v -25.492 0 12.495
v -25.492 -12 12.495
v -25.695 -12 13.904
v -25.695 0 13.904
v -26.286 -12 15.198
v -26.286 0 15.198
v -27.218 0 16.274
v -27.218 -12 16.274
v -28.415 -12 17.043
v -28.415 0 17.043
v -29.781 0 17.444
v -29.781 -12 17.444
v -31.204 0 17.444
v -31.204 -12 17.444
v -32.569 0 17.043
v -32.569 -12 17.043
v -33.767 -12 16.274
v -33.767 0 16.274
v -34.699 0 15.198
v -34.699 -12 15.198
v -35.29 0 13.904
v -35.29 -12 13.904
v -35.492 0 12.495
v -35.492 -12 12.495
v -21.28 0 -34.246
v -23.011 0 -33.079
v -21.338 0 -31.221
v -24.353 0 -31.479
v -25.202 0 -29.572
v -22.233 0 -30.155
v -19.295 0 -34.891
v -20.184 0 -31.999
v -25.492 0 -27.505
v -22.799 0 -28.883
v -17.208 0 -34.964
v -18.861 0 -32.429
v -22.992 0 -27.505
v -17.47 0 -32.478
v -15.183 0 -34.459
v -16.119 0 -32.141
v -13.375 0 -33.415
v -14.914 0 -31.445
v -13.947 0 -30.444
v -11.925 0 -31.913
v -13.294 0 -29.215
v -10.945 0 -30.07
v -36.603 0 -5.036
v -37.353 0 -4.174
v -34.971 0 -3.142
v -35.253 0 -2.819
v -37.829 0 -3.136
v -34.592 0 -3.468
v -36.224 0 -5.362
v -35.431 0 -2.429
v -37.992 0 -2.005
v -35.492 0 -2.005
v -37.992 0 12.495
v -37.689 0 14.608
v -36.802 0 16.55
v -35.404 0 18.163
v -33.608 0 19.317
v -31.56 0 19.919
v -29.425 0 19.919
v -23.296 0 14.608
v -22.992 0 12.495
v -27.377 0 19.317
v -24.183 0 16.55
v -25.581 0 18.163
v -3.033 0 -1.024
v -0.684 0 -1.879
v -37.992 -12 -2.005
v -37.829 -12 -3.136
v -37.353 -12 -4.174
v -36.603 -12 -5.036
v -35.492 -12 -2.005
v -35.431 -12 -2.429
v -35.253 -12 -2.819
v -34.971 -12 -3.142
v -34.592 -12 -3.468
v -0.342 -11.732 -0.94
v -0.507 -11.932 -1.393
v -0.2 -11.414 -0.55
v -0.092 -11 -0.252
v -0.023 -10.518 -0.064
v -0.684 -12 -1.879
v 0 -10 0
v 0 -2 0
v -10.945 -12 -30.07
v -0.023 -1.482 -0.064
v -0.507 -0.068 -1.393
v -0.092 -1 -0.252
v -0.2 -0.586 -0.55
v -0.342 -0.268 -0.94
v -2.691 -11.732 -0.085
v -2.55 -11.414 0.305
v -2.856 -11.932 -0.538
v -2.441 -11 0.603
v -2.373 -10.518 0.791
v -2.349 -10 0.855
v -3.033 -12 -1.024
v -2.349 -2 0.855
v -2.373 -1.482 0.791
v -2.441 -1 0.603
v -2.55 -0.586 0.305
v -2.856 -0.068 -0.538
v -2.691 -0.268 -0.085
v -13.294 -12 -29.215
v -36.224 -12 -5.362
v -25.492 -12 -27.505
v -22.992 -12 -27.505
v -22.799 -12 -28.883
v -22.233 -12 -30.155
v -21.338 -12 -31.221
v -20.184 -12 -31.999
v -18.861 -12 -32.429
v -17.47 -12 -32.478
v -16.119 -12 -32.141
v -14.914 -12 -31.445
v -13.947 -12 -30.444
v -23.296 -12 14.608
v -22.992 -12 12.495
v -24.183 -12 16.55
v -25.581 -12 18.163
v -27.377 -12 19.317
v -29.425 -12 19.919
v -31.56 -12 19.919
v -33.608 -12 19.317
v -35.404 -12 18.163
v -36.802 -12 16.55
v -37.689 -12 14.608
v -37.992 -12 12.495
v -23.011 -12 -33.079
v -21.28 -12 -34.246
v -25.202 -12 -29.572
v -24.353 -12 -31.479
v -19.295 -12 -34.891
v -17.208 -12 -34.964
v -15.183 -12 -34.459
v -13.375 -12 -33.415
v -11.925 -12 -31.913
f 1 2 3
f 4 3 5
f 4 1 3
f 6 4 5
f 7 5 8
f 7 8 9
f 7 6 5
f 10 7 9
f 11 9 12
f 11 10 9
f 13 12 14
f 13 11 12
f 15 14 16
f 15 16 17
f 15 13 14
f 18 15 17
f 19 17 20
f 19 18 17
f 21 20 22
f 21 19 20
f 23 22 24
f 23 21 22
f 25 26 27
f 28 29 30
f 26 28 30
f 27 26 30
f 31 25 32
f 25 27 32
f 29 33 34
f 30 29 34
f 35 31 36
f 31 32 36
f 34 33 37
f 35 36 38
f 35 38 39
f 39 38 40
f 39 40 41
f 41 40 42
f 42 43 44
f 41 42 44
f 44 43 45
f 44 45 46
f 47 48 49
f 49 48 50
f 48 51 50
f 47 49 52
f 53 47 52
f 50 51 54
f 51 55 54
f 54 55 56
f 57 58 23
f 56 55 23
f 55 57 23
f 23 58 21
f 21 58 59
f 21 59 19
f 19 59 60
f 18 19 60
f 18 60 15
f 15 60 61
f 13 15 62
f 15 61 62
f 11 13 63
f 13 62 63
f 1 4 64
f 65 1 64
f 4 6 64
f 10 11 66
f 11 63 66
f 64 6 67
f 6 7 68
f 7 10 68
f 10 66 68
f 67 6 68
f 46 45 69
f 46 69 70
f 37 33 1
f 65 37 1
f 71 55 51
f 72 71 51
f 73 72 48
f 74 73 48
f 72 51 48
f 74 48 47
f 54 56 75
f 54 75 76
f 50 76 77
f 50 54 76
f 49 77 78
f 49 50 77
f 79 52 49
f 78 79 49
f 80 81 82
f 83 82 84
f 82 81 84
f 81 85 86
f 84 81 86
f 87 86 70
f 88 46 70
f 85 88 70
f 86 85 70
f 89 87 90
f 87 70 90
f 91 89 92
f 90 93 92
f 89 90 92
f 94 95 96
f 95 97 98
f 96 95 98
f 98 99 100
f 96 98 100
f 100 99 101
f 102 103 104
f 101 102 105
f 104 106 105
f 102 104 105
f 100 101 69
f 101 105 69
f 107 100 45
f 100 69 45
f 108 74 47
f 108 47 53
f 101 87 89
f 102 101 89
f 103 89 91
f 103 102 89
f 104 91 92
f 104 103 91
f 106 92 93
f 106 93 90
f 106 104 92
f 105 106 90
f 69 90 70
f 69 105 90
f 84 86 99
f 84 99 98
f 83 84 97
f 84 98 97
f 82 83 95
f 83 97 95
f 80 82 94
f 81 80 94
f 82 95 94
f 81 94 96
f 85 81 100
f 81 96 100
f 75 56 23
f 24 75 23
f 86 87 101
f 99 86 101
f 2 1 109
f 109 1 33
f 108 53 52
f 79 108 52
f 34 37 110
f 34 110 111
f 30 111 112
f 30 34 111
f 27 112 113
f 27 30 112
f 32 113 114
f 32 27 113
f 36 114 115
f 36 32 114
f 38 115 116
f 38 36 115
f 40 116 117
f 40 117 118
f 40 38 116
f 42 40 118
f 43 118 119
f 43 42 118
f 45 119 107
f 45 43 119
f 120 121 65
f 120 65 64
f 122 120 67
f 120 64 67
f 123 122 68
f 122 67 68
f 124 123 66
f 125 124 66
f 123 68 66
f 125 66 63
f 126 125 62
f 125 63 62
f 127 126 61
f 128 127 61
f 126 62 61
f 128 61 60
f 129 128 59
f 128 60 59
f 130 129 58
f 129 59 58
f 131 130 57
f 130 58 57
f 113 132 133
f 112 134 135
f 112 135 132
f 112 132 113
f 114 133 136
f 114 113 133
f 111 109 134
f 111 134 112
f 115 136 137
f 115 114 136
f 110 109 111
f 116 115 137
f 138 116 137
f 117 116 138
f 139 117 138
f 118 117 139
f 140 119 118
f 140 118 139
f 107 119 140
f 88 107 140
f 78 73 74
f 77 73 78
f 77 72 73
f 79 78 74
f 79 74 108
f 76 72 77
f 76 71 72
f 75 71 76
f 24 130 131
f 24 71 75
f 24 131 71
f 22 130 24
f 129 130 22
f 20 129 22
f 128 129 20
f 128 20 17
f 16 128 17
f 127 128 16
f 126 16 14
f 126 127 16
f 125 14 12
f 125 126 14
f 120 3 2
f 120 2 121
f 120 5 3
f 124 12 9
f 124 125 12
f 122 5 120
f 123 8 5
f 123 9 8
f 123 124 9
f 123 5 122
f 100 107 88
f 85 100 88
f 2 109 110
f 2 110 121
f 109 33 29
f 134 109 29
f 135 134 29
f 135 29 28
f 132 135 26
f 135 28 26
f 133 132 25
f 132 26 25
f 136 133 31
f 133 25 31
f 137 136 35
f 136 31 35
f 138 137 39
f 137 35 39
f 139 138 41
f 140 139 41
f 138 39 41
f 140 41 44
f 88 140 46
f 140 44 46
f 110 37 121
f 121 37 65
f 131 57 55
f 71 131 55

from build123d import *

# Parameters (mm, degrees)
PAD_DEPTH   = 12
FILLET_R    = 2
FILLET001_R = 2


with BuildPart() as part:
    # Sketch → Pad (new body)
    with BuildSketch(Plane.XZ):
        with BuildLine():
            Line((-35.492344, -2.005014), (-35.492339, 12.494989))
            ThreePointArc((-25.492339, 12.494987), (-30.492338, 17.494987), (-35.492339, 12.494989))
            Line((-25.492339, 12.494987), (-25.492339, -27.505013))
            ThreePointArc((-25.492339, -27.505013), (-19.294701, -34.891071), (-10.944645, -30.070164))
            Line((-10.944645, -30.070164), (0, 0))
            Line((0, 0), (-2.349232, 0.85505))
            Line((-2.349232, 0.85505), (-13.293876, -29.215114))
            ThreePointArc((-22.992339, -27.505013), (-18.86058, -32.429052), (-13.293876, -29.215114))
            Line((-22.992339, -27.505013), (-22.992339, 12.494987))
            ThreePointArc((-22.992339, 12.494987), (-30.492338, 19.994987), (-37.992339, 12.49499))
            Line((-37.992339, 12.49499), (-37.992344, -2.005013))
            ThreePointArc((-37.992344, -2.005013), (-37.628359, -3.672167), (-36.602644, -5.035911))
            Line((-36.602644, -5.035911), (-36.223782, -5.362198))
            Line((-36.223782, -5.362198), (-34.592345, -3.467888))
            Line((-34.592345, -3.467888), (-34.971207, -3.1416))
            ThreePointArc((-35.492344, -2.005014), (-35.35585, -2.630196), (-34.971207, -3.1416))
        make_face()
    extrude(amount=PAD_DEPTH)

    # Fillet
    fillet_edges = [part.edges().sort_by_distance(p)[0] for p in [
        (-1.174616, -12, 0.427525),
    ]]
    fillet(fillet_edges, radius=FILLET_R)

    # Fillet001
    fillet001_edges = [part.edges().sort_by_distance(p)[0] for p in [
        (-1.174616, 0, 0.427525),
    ]]
    fillet(fillet001_edges, radius=FILLET001_R)


solid = part.part
